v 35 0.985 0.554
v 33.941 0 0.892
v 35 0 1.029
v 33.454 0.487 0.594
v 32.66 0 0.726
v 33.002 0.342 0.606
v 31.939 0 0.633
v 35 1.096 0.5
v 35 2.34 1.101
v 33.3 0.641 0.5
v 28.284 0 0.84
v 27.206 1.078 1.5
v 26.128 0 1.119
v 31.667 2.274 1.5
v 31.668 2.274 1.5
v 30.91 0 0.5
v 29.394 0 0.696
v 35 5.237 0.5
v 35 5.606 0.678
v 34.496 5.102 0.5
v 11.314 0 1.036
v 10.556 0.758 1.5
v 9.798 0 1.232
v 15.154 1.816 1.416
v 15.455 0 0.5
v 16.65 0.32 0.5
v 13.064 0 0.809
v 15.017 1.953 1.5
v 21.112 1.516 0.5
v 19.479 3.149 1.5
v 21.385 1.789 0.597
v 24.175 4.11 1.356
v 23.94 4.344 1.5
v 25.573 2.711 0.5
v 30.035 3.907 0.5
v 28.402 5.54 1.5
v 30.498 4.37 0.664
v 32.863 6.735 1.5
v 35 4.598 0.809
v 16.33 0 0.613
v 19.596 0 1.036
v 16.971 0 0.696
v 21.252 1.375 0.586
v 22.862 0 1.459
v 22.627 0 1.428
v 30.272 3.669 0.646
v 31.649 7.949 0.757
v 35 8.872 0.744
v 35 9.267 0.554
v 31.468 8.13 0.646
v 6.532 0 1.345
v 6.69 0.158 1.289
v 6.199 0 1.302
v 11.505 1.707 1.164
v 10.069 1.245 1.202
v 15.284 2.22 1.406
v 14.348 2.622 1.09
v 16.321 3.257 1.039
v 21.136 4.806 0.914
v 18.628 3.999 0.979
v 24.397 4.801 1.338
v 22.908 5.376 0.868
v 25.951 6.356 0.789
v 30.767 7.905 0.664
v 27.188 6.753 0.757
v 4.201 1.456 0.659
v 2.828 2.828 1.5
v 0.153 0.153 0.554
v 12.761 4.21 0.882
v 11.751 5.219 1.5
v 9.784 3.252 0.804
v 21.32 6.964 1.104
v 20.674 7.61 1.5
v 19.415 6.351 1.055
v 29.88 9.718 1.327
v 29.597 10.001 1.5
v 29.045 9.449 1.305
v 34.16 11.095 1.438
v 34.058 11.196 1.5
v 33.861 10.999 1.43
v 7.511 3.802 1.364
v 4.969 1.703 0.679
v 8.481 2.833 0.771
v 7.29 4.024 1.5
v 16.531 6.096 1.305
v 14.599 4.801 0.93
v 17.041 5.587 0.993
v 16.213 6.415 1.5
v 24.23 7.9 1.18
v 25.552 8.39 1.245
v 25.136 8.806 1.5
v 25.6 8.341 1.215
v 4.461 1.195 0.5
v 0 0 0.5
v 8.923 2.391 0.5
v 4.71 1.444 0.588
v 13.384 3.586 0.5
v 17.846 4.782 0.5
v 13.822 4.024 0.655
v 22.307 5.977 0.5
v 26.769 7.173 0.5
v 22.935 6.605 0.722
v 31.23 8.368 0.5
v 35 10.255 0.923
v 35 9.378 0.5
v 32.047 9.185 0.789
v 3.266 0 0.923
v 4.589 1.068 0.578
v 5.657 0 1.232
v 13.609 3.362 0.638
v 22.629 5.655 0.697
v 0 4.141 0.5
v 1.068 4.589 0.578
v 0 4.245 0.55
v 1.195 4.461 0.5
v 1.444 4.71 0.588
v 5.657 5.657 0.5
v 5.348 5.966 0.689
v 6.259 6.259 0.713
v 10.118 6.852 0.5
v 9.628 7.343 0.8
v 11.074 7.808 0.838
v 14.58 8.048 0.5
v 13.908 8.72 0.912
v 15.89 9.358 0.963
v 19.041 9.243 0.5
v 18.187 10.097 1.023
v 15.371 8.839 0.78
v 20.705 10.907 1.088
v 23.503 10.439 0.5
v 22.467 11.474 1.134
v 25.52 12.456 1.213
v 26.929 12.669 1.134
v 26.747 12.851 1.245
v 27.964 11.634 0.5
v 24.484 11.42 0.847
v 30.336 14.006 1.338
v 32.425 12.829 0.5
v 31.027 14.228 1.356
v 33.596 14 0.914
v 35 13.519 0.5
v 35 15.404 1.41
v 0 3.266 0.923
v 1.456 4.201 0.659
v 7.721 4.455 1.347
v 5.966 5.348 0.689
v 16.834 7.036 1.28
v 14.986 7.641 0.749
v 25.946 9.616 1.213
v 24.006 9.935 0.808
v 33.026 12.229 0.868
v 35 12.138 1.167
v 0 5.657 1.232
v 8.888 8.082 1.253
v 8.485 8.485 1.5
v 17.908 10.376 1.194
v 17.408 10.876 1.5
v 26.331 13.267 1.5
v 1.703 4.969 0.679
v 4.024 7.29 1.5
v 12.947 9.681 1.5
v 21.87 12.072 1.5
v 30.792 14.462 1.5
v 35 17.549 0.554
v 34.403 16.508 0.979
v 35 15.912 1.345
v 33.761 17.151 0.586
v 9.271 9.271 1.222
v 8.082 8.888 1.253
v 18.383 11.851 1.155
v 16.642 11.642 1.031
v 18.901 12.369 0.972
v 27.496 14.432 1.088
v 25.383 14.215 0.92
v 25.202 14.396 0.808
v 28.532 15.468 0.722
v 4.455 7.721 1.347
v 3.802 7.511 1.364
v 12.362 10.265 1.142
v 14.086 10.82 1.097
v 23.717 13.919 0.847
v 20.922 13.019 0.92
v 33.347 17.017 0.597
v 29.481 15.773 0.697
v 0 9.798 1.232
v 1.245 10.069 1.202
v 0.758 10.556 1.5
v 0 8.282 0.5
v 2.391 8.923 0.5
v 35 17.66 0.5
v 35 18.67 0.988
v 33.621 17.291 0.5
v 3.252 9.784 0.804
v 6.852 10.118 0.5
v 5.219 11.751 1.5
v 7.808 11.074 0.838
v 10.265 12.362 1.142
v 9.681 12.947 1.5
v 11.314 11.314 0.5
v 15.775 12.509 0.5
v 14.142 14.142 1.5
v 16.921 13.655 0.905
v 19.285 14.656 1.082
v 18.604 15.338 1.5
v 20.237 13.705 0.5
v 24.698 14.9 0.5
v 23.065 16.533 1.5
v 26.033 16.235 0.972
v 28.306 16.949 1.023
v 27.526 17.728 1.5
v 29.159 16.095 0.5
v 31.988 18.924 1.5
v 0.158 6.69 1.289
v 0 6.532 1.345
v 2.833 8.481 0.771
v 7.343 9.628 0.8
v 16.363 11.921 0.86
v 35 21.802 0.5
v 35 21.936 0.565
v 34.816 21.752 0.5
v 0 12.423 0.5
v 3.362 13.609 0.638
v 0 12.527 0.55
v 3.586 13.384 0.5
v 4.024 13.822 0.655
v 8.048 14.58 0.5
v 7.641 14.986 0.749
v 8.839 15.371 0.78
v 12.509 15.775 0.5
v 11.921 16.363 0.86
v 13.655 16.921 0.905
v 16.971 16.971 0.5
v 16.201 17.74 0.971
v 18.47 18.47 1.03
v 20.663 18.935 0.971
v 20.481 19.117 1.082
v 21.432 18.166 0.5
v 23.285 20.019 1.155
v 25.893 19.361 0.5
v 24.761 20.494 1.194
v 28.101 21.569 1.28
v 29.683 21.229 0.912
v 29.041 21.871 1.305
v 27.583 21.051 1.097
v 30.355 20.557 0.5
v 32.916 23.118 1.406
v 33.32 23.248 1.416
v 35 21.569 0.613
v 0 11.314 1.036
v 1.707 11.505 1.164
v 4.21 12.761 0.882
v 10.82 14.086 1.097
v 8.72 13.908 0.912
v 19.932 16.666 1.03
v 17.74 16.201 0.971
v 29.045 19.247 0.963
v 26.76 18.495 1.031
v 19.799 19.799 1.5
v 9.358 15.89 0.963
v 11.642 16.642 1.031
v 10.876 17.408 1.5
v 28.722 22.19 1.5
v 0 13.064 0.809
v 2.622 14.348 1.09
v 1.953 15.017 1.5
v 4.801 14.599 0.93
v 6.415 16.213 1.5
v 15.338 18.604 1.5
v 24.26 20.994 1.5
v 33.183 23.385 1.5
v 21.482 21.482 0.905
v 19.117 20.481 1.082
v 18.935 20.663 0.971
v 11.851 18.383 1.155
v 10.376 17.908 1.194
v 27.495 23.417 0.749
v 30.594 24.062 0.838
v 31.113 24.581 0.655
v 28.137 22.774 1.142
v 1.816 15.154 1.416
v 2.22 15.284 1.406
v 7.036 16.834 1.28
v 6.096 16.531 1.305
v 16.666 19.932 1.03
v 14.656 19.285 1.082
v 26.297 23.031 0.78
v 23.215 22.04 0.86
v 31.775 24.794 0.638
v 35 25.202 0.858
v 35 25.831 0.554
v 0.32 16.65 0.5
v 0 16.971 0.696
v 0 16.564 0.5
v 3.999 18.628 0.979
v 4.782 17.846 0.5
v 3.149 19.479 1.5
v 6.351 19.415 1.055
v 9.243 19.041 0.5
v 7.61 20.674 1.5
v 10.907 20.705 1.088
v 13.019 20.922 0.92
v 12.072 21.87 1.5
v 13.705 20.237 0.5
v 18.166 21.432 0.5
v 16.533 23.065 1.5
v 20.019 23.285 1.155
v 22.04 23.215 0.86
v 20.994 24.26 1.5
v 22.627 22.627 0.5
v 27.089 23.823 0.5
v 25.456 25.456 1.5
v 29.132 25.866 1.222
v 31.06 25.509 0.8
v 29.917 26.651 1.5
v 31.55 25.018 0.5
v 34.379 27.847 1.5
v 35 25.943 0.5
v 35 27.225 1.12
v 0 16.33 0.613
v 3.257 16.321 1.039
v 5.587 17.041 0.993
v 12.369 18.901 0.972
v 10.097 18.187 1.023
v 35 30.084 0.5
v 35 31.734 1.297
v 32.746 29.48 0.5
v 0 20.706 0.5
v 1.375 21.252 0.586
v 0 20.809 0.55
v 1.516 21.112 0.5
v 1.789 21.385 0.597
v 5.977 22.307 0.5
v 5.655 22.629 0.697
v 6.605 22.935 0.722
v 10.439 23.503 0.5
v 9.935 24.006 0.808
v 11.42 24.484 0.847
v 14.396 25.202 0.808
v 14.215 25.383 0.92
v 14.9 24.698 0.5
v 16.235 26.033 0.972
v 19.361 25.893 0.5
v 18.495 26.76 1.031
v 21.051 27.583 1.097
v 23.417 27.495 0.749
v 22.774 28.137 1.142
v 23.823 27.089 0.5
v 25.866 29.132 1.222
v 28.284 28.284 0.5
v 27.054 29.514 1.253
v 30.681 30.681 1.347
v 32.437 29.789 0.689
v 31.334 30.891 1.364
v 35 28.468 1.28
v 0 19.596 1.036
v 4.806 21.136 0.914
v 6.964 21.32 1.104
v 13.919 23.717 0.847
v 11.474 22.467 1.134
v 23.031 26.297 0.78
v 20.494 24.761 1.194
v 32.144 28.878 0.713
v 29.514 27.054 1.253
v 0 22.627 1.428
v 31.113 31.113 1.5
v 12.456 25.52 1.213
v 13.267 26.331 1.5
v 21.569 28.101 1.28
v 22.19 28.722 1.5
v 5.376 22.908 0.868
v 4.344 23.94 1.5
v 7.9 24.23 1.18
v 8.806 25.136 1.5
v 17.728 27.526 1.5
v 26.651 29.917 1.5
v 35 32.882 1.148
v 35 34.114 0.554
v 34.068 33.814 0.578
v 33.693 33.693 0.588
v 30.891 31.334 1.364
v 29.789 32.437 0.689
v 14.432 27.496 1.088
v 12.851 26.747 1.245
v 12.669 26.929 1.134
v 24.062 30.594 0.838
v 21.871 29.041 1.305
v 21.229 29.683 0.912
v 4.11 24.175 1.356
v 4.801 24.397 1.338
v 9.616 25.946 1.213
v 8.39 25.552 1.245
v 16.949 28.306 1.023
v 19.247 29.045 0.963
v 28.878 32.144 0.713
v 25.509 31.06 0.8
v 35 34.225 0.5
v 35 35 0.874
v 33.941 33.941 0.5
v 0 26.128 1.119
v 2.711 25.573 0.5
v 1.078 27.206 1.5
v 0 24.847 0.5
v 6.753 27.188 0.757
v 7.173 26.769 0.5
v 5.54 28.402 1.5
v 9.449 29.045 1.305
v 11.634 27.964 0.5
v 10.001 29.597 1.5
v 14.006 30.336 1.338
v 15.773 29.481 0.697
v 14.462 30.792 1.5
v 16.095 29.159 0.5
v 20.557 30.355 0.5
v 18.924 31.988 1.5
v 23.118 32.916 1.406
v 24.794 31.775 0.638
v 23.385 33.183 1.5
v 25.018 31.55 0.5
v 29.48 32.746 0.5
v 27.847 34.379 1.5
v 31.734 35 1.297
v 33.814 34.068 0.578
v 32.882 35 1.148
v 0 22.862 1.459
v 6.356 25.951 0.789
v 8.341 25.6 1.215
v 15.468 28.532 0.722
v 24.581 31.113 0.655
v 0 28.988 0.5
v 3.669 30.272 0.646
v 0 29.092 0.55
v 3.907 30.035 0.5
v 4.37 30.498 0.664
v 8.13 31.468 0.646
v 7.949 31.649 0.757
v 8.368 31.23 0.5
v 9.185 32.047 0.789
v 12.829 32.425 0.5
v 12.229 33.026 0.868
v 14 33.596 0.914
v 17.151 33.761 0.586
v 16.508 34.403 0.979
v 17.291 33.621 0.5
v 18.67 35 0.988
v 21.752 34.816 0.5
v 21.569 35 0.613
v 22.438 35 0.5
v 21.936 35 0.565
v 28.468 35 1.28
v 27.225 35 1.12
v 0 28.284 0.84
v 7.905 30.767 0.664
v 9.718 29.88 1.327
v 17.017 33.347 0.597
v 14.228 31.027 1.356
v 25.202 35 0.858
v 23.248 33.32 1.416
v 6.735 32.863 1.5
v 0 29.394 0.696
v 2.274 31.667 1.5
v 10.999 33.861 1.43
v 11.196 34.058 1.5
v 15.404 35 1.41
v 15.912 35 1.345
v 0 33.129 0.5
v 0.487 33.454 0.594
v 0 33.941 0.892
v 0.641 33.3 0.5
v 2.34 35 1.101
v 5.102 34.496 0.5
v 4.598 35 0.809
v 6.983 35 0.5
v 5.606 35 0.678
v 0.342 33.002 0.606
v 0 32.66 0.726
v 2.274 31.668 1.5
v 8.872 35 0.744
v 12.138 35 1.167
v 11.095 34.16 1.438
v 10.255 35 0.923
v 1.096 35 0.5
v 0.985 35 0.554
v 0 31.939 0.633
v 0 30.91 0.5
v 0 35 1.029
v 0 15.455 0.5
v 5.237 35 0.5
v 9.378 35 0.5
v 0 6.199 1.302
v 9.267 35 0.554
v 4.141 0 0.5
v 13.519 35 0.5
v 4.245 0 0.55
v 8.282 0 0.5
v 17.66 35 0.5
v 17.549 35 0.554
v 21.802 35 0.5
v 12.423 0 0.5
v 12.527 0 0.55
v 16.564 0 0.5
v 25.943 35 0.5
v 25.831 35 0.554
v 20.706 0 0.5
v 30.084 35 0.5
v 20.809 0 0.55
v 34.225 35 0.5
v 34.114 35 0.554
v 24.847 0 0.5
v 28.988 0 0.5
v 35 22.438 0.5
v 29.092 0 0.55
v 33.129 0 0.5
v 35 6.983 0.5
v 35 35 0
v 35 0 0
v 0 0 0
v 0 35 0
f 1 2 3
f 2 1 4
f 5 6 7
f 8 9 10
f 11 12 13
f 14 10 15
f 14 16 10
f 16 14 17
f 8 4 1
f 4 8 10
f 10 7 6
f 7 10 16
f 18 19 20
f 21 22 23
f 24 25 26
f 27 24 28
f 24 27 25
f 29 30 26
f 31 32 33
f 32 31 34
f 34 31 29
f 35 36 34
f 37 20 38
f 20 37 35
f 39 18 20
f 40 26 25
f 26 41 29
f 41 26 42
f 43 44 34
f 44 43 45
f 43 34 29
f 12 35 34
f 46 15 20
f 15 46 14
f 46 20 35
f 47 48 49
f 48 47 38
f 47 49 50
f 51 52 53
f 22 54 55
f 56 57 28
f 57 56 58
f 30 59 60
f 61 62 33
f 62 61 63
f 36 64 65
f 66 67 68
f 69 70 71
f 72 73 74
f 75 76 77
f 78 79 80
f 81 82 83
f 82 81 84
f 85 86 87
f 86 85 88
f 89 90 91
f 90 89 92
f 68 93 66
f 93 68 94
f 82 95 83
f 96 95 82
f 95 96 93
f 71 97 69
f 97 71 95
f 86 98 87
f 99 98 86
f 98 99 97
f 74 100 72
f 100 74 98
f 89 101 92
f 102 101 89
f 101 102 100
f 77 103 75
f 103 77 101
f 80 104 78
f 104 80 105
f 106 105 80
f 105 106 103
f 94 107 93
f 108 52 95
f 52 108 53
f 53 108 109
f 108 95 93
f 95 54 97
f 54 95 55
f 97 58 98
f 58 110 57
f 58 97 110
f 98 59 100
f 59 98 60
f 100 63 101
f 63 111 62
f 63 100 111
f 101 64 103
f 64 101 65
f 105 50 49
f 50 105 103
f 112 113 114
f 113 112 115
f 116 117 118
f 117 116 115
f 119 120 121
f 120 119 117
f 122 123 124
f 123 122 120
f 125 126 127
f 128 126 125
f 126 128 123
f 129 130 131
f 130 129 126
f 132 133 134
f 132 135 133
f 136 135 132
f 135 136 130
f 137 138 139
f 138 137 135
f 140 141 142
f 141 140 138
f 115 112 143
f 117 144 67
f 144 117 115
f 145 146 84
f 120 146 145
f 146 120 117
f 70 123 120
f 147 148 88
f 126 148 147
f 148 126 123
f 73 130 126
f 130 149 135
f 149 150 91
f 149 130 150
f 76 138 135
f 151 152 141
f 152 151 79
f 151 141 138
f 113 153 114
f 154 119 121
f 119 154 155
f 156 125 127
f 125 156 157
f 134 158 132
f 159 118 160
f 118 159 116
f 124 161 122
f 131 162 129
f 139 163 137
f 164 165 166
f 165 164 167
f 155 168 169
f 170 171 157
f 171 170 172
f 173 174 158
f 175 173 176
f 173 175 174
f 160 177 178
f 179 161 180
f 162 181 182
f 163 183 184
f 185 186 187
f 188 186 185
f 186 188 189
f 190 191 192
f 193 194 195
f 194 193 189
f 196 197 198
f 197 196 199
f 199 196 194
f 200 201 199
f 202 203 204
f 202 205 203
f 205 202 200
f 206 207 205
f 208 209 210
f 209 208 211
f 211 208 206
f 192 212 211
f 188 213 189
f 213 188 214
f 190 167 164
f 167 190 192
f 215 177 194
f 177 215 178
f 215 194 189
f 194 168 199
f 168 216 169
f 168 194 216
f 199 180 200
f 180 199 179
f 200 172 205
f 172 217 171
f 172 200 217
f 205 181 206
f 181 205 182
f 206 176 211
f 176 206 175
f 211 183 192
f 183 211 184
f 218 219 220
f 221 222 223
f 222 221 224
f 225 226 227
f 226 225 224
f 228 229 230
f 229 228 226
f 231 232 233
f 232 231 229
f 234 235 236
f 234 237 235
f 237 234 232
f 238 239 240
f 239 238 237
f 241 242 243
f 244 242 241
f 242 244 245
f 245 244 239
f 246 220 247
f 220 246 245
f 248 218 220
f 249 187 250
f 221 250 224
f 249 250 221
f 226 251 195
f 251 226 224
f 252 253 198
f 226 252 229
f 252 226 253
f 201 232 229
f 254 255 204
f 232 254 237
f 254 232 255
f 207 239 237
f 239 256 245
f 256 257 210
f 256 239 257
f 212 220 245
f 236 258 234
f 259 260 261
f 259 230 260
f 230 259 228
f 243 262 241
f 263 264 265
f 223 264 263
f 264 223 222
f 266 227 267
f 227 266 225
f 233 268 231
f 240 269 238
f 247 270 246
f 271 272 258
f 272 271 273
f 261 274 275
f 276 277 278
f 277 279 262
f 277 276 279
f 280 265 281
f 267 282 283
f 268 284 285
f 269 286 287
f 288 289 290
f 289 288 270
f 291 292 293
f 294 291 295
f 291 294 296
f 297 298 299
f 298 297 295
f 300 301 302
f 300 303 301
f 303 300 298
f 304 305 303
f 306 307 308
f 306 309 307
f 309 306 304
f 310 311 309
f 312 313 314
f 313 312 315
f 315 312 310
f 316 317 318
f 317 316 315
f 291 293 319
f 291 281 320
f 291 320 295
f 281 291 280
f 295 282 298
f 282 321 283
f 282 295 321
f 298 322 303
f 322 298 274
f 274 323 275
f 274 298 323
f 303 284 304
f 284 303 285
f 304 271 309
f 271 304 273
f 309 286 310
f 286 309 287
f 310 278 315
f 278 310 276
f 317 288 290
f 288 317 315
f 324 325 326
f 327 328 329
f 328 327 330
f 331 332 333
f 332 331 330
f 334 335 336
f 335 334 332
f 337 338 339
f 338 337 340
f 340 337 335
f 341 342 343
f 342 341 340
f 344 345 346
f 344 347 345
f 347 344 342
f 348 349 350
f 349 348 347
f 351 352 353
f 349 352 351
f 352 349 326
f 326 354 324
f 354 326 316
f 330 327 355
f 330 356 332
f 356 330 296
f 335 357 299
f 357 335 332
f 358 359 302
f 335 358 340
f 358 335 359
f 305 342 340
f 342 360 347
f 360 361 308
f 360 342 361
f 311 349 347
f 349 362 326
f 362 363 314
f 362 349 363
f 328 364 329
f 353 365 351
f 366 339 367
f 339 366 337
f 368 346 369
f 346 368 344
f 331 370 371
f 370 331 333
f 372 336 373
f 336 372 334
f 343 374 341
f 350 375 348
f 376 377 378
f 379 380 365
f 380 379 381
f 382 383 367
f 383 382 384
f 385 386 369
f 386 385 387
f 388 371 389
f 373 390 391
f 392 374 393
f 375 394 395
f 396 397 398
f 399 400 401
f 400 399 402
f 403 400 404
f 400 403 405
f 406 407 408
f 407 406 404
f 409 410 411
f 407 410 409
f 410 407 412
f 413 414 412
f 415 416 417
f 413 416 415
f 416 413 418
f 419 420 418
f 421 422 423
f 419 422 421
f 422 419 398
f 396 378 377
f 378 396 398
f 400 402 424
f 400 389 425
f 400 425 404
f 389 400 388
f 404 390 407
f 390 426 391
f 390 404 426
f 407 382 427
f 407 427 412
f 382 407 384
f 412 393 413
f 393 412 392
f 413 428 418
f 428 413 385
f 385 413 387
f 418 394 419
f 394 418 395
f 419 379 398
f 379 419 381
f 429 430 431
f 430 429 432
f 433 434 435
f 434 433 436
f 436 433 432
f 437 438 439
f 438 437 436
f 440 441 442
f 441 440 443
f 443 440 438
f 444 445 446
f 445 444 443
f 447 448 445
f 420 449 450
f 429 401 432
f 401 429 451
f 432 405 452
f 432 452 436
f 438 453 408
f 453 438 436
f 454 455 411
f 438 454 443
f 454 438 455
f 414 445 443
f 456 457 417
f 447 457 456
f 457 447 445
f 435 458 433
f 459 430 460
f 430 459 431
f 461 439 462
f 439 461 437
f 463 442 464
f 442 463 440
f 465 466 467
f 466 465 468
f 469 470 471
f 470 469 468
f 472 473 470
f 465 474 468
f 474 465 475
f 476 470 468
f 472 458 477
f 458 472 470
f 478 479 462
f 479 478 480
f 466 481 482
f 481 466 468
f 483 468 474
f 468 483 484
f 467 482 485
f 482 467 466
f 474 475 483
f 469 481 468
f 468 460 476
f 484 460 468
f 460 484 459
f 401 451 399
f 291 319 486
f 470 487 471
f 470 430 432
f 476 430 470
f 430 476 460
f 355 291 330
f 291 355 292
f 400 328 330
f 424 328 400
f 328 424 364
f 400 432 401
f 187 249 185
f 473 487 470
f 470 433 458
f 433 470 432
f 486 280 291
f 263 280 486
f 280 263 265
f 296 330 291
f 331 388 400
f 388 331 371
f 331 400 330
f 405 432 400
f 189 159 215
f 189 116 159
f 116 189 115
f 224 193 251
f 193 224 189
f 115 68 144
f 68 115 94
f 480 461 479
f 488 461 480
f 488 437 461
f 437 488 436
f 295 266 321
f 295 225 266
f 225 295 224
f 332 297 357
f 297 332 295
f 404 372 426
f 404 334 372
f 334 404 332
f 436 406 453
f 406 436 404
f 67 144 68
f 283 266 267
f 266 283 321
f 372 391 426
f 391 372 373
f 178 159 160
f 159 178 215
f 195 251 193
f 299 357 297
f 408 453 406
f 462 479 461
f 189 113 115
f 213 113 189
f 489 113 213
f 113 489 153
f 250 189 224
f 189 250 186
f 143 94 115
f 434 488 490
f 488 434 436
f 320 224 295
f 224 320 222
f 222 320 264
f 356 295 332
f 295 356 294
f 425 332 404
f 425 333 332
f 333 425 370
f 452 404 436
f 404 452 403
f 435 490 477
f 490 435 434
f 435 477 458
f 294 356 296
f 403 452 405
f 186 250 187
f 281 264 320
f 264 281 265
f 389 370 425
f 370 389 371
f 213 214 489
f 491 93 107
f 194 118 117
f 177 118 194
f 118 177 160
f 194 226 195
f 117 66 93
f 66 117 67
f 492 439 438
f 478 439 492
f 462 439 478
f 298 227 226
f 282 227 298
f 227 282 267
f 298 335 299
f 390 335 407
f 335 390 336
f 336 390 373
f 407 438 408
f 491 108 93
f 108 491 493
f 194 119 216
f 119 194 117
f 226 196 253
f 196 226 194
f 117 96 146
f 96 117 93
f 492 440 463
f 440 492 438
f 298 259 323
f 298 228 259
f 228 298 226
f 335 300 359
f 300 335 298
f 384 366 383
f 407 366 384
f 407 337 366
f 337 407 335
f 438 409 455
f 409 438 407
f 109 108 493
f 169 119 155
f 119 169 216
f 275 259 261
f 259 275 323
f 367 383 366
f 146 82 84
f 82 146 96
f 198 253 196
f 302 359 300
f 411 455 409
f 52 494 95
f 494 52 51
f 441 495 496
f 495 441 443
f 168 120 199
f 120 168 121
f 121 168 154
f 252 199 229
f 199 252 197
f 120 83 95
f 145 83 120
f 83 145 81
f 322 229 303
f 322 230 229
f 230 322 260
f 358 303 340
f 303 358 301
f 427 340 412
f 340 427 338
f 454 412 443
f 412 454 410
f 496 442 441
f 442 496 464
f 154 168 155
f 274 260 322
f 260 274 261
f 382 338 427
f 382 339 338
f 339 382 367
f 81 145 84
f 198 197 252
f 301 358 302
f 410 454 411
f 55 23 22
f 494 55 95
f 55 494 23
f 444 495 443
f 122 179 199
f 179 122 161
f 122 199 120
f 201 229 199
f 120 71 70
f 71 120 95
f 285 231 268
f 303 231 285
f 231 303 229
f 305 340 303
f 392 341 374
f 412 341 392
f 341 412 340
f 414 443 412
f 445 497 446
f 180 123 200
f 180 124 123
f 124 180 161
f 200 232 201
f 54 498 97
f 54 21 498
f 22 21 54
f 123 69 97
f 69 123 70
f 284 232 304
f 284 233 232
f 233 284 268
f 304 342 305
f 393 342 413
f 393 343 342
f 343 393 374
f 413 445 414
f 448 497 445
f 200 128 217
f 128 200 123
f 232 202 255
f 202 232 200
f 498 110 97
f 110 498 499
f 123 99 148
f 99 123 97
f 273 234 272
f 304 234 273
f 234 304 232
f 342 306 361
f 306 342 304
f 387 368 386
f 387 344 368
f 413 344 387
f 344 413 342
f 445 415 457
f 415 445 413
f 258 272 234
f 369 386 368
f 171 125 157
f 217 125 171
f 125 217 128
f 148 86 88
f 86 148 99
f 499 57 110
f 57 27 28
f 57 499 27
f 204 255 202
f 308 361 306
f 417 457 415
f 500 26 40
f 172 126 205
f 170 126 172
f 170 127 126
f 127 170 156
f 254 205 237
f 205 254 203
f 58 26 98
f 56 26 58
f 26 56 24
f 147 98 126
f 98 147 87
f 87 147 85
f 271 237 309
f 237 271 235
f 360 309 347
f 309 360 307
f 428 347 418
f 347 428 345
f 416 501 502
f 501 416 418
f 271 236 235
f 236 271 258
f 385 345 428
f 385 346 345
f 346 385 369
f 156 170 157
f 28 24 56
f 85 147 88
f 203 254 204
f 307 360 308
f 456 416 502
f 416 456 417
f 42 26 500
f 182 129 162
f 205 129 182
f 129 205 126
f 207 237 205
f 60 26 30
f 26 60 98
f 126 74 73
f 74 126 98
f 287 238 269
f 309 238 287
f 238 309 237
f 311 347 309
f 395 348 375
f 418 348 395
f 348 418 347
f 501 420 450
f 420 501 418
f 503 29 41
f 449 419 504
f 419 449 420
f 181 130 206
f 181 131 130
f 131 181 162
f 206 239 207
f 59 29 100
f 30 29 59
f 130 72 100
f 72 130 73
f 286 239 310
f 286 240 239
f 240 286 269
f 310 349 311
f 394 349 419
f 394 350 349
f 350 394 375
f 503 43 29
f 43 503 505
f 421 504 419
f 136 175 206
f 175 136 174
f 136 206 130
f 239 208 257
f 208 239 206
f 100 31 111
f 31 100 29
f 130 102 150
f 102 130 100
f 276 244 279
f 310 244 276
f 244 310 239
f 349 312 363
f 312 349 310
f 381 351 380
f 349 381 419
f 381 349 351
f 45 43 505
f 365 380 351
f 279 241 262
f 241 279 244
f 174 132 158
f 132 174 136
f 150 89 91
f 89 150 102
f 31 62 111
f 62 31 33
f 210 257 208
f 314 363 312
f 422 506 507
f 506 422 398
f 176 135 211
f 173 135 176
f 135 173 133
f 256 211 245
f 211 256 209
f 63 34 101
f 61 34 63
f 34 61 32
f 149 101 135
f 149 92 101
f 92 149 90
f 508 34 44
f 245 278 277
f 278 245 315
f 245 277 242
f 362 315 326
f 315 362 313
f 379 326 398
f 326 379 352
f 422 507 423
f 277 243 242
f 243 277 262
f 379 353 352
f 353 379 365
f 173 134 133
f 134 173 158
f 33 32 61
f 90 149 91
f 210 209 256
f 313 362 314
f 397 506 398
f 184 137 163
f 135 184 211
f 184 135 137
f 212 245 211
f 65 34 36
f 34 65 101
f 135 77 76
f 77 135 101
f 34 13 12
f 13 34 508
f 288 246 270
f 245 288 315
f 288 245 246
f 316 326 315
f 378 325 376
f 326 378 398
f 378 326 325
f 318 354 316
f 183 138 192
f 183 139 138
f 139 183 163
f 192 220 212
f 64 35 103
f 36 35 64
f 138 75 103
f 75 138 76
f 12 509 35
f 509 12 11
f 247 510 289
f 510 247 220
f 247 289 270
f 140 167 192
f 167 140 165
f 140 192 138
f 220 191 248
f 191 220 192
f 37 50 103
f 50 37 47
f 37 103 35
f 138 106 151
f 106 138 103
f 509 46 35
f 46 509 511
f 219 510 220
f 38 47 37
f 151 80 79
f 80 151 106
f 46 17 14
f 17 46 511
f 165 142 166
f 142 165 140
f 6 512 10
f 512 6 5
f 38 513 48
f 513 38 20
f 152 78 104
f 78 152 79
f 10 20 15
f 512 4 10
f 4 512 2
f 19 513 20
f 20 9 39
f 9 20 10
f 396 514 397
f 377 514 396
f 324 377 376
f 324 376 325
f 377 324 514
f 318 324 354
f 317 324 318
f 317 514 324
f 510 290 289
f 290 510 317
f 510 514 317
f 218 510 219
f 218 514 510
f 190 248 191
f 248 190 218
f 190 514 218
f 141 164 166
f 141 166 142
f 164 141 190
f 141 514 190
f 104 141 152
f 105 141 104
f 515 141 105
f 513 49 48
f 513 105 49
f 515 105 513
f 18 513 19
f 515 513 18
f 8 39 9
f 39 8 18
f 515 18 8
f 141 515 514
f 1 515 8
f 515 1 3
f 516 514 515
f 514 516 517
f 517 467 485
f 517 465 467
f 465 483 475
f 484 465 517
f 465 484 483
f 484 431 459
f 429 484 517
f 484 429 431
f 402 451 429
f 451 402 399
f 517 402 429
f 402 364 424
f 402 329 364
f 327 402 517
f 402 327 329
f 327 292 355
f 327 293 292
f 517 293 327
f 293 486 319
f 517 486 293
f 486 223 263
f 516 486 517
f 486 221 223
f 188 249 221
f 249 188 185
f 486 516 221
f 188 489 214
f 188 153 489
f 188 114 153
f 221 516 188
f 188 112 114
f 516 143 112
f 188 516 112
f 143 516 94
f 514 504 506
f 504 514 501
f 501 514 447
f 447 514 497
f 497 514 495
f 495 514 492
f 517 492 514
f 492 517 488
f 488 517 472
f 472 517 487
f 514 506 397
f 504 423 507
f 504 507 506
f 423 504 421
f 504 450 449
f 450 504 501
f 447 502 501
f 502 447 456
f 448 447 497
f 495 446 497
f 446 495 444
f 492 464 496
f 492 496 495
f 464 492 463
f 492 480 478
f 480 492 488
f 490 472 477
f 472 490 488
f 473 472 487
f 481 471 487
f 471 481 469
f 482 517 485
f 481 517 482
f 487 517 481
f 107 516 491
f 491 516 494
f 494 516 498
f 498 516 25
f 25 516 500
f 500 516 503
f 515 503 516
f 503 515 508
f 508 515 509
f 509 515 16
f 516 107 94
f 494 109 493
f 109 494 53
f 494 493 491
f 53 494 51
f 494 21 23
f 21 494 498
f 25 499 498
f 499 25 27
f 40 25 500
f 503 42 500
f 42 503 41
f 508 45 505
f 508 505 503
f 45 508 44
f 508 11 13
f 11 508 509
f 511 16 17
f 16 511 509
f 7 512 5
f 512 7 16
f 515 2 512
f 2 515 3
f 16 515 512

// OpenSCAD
/*
 * knurled surface library
 *
 * use <knurled_surface.scad>
 * knurled_surface();
 */

// generate a "knurler" that covers at least the given size rectangle
// depth of the knurl will be controlled by size.z
// angle controlls the obliqueness of the diamond pattern
// the "knurler" creates a knurling pattern made of long, thin
// rectangular prisms that are rotated 45°
// these are arranged in a hash pattern at the given angle
module knurl(size=[10,10,1], angle=30)
{
	width=size.z*2;
	angle=angle/2;

	module yhash()
	{
		disp=width/cos(angle);
		dy=size.x*tan(angle);
		count=floor(size.y/width)+1;
		precount=floor(dy/width)+1;
		for (yy=[-precount:1:count])
			translate([0,yy*disp,0])
				rotate([45,0,angle])
					translate([-width/2,0,0])
						cube([(size.x+width)/cos(angle),
							width/sqrt(2),
							width/sqrt(2)]);
	}

	module xhash()
	{
		disp=width/cos(angle);
		dx=size.y*tan(angle);
		count=floor(size.x/width)+1;
		precount=floor(dx/width)+1;
		for (xx=[-precount:1:count])
			translate([xx*disp,0,0])
				rotate([45,0,90-angle])
					translate([-width/2,0,0])
						cube([(size.y+width)/cos(angle),
							width/sqrt(2),
							width/sqrt(2)]);
	}

	union() {
		yhash();
		xhash();
	}
}

// create a rectangular knurled surface by subtracting a
// "knurler" from a cube
// the thickness of the cube is controlled by the thickness
// parameter rather than by size.z
module knurled_surface(size=[10,10,1], angle=30, thickness=2, scale=1)
{
	scale([scale,scale,1])
		difference() {
			cube([size.x/scale,size.y/scale,thickness]);
			translate([0,0,thickness-size.z])
				knurl([size.x/scale,size.y/scale,size.z], angle);
		}
}

// example knurled surface
knurled_surface(size=[35,35,1], angle=30, thickness=1.5, scale=2);
